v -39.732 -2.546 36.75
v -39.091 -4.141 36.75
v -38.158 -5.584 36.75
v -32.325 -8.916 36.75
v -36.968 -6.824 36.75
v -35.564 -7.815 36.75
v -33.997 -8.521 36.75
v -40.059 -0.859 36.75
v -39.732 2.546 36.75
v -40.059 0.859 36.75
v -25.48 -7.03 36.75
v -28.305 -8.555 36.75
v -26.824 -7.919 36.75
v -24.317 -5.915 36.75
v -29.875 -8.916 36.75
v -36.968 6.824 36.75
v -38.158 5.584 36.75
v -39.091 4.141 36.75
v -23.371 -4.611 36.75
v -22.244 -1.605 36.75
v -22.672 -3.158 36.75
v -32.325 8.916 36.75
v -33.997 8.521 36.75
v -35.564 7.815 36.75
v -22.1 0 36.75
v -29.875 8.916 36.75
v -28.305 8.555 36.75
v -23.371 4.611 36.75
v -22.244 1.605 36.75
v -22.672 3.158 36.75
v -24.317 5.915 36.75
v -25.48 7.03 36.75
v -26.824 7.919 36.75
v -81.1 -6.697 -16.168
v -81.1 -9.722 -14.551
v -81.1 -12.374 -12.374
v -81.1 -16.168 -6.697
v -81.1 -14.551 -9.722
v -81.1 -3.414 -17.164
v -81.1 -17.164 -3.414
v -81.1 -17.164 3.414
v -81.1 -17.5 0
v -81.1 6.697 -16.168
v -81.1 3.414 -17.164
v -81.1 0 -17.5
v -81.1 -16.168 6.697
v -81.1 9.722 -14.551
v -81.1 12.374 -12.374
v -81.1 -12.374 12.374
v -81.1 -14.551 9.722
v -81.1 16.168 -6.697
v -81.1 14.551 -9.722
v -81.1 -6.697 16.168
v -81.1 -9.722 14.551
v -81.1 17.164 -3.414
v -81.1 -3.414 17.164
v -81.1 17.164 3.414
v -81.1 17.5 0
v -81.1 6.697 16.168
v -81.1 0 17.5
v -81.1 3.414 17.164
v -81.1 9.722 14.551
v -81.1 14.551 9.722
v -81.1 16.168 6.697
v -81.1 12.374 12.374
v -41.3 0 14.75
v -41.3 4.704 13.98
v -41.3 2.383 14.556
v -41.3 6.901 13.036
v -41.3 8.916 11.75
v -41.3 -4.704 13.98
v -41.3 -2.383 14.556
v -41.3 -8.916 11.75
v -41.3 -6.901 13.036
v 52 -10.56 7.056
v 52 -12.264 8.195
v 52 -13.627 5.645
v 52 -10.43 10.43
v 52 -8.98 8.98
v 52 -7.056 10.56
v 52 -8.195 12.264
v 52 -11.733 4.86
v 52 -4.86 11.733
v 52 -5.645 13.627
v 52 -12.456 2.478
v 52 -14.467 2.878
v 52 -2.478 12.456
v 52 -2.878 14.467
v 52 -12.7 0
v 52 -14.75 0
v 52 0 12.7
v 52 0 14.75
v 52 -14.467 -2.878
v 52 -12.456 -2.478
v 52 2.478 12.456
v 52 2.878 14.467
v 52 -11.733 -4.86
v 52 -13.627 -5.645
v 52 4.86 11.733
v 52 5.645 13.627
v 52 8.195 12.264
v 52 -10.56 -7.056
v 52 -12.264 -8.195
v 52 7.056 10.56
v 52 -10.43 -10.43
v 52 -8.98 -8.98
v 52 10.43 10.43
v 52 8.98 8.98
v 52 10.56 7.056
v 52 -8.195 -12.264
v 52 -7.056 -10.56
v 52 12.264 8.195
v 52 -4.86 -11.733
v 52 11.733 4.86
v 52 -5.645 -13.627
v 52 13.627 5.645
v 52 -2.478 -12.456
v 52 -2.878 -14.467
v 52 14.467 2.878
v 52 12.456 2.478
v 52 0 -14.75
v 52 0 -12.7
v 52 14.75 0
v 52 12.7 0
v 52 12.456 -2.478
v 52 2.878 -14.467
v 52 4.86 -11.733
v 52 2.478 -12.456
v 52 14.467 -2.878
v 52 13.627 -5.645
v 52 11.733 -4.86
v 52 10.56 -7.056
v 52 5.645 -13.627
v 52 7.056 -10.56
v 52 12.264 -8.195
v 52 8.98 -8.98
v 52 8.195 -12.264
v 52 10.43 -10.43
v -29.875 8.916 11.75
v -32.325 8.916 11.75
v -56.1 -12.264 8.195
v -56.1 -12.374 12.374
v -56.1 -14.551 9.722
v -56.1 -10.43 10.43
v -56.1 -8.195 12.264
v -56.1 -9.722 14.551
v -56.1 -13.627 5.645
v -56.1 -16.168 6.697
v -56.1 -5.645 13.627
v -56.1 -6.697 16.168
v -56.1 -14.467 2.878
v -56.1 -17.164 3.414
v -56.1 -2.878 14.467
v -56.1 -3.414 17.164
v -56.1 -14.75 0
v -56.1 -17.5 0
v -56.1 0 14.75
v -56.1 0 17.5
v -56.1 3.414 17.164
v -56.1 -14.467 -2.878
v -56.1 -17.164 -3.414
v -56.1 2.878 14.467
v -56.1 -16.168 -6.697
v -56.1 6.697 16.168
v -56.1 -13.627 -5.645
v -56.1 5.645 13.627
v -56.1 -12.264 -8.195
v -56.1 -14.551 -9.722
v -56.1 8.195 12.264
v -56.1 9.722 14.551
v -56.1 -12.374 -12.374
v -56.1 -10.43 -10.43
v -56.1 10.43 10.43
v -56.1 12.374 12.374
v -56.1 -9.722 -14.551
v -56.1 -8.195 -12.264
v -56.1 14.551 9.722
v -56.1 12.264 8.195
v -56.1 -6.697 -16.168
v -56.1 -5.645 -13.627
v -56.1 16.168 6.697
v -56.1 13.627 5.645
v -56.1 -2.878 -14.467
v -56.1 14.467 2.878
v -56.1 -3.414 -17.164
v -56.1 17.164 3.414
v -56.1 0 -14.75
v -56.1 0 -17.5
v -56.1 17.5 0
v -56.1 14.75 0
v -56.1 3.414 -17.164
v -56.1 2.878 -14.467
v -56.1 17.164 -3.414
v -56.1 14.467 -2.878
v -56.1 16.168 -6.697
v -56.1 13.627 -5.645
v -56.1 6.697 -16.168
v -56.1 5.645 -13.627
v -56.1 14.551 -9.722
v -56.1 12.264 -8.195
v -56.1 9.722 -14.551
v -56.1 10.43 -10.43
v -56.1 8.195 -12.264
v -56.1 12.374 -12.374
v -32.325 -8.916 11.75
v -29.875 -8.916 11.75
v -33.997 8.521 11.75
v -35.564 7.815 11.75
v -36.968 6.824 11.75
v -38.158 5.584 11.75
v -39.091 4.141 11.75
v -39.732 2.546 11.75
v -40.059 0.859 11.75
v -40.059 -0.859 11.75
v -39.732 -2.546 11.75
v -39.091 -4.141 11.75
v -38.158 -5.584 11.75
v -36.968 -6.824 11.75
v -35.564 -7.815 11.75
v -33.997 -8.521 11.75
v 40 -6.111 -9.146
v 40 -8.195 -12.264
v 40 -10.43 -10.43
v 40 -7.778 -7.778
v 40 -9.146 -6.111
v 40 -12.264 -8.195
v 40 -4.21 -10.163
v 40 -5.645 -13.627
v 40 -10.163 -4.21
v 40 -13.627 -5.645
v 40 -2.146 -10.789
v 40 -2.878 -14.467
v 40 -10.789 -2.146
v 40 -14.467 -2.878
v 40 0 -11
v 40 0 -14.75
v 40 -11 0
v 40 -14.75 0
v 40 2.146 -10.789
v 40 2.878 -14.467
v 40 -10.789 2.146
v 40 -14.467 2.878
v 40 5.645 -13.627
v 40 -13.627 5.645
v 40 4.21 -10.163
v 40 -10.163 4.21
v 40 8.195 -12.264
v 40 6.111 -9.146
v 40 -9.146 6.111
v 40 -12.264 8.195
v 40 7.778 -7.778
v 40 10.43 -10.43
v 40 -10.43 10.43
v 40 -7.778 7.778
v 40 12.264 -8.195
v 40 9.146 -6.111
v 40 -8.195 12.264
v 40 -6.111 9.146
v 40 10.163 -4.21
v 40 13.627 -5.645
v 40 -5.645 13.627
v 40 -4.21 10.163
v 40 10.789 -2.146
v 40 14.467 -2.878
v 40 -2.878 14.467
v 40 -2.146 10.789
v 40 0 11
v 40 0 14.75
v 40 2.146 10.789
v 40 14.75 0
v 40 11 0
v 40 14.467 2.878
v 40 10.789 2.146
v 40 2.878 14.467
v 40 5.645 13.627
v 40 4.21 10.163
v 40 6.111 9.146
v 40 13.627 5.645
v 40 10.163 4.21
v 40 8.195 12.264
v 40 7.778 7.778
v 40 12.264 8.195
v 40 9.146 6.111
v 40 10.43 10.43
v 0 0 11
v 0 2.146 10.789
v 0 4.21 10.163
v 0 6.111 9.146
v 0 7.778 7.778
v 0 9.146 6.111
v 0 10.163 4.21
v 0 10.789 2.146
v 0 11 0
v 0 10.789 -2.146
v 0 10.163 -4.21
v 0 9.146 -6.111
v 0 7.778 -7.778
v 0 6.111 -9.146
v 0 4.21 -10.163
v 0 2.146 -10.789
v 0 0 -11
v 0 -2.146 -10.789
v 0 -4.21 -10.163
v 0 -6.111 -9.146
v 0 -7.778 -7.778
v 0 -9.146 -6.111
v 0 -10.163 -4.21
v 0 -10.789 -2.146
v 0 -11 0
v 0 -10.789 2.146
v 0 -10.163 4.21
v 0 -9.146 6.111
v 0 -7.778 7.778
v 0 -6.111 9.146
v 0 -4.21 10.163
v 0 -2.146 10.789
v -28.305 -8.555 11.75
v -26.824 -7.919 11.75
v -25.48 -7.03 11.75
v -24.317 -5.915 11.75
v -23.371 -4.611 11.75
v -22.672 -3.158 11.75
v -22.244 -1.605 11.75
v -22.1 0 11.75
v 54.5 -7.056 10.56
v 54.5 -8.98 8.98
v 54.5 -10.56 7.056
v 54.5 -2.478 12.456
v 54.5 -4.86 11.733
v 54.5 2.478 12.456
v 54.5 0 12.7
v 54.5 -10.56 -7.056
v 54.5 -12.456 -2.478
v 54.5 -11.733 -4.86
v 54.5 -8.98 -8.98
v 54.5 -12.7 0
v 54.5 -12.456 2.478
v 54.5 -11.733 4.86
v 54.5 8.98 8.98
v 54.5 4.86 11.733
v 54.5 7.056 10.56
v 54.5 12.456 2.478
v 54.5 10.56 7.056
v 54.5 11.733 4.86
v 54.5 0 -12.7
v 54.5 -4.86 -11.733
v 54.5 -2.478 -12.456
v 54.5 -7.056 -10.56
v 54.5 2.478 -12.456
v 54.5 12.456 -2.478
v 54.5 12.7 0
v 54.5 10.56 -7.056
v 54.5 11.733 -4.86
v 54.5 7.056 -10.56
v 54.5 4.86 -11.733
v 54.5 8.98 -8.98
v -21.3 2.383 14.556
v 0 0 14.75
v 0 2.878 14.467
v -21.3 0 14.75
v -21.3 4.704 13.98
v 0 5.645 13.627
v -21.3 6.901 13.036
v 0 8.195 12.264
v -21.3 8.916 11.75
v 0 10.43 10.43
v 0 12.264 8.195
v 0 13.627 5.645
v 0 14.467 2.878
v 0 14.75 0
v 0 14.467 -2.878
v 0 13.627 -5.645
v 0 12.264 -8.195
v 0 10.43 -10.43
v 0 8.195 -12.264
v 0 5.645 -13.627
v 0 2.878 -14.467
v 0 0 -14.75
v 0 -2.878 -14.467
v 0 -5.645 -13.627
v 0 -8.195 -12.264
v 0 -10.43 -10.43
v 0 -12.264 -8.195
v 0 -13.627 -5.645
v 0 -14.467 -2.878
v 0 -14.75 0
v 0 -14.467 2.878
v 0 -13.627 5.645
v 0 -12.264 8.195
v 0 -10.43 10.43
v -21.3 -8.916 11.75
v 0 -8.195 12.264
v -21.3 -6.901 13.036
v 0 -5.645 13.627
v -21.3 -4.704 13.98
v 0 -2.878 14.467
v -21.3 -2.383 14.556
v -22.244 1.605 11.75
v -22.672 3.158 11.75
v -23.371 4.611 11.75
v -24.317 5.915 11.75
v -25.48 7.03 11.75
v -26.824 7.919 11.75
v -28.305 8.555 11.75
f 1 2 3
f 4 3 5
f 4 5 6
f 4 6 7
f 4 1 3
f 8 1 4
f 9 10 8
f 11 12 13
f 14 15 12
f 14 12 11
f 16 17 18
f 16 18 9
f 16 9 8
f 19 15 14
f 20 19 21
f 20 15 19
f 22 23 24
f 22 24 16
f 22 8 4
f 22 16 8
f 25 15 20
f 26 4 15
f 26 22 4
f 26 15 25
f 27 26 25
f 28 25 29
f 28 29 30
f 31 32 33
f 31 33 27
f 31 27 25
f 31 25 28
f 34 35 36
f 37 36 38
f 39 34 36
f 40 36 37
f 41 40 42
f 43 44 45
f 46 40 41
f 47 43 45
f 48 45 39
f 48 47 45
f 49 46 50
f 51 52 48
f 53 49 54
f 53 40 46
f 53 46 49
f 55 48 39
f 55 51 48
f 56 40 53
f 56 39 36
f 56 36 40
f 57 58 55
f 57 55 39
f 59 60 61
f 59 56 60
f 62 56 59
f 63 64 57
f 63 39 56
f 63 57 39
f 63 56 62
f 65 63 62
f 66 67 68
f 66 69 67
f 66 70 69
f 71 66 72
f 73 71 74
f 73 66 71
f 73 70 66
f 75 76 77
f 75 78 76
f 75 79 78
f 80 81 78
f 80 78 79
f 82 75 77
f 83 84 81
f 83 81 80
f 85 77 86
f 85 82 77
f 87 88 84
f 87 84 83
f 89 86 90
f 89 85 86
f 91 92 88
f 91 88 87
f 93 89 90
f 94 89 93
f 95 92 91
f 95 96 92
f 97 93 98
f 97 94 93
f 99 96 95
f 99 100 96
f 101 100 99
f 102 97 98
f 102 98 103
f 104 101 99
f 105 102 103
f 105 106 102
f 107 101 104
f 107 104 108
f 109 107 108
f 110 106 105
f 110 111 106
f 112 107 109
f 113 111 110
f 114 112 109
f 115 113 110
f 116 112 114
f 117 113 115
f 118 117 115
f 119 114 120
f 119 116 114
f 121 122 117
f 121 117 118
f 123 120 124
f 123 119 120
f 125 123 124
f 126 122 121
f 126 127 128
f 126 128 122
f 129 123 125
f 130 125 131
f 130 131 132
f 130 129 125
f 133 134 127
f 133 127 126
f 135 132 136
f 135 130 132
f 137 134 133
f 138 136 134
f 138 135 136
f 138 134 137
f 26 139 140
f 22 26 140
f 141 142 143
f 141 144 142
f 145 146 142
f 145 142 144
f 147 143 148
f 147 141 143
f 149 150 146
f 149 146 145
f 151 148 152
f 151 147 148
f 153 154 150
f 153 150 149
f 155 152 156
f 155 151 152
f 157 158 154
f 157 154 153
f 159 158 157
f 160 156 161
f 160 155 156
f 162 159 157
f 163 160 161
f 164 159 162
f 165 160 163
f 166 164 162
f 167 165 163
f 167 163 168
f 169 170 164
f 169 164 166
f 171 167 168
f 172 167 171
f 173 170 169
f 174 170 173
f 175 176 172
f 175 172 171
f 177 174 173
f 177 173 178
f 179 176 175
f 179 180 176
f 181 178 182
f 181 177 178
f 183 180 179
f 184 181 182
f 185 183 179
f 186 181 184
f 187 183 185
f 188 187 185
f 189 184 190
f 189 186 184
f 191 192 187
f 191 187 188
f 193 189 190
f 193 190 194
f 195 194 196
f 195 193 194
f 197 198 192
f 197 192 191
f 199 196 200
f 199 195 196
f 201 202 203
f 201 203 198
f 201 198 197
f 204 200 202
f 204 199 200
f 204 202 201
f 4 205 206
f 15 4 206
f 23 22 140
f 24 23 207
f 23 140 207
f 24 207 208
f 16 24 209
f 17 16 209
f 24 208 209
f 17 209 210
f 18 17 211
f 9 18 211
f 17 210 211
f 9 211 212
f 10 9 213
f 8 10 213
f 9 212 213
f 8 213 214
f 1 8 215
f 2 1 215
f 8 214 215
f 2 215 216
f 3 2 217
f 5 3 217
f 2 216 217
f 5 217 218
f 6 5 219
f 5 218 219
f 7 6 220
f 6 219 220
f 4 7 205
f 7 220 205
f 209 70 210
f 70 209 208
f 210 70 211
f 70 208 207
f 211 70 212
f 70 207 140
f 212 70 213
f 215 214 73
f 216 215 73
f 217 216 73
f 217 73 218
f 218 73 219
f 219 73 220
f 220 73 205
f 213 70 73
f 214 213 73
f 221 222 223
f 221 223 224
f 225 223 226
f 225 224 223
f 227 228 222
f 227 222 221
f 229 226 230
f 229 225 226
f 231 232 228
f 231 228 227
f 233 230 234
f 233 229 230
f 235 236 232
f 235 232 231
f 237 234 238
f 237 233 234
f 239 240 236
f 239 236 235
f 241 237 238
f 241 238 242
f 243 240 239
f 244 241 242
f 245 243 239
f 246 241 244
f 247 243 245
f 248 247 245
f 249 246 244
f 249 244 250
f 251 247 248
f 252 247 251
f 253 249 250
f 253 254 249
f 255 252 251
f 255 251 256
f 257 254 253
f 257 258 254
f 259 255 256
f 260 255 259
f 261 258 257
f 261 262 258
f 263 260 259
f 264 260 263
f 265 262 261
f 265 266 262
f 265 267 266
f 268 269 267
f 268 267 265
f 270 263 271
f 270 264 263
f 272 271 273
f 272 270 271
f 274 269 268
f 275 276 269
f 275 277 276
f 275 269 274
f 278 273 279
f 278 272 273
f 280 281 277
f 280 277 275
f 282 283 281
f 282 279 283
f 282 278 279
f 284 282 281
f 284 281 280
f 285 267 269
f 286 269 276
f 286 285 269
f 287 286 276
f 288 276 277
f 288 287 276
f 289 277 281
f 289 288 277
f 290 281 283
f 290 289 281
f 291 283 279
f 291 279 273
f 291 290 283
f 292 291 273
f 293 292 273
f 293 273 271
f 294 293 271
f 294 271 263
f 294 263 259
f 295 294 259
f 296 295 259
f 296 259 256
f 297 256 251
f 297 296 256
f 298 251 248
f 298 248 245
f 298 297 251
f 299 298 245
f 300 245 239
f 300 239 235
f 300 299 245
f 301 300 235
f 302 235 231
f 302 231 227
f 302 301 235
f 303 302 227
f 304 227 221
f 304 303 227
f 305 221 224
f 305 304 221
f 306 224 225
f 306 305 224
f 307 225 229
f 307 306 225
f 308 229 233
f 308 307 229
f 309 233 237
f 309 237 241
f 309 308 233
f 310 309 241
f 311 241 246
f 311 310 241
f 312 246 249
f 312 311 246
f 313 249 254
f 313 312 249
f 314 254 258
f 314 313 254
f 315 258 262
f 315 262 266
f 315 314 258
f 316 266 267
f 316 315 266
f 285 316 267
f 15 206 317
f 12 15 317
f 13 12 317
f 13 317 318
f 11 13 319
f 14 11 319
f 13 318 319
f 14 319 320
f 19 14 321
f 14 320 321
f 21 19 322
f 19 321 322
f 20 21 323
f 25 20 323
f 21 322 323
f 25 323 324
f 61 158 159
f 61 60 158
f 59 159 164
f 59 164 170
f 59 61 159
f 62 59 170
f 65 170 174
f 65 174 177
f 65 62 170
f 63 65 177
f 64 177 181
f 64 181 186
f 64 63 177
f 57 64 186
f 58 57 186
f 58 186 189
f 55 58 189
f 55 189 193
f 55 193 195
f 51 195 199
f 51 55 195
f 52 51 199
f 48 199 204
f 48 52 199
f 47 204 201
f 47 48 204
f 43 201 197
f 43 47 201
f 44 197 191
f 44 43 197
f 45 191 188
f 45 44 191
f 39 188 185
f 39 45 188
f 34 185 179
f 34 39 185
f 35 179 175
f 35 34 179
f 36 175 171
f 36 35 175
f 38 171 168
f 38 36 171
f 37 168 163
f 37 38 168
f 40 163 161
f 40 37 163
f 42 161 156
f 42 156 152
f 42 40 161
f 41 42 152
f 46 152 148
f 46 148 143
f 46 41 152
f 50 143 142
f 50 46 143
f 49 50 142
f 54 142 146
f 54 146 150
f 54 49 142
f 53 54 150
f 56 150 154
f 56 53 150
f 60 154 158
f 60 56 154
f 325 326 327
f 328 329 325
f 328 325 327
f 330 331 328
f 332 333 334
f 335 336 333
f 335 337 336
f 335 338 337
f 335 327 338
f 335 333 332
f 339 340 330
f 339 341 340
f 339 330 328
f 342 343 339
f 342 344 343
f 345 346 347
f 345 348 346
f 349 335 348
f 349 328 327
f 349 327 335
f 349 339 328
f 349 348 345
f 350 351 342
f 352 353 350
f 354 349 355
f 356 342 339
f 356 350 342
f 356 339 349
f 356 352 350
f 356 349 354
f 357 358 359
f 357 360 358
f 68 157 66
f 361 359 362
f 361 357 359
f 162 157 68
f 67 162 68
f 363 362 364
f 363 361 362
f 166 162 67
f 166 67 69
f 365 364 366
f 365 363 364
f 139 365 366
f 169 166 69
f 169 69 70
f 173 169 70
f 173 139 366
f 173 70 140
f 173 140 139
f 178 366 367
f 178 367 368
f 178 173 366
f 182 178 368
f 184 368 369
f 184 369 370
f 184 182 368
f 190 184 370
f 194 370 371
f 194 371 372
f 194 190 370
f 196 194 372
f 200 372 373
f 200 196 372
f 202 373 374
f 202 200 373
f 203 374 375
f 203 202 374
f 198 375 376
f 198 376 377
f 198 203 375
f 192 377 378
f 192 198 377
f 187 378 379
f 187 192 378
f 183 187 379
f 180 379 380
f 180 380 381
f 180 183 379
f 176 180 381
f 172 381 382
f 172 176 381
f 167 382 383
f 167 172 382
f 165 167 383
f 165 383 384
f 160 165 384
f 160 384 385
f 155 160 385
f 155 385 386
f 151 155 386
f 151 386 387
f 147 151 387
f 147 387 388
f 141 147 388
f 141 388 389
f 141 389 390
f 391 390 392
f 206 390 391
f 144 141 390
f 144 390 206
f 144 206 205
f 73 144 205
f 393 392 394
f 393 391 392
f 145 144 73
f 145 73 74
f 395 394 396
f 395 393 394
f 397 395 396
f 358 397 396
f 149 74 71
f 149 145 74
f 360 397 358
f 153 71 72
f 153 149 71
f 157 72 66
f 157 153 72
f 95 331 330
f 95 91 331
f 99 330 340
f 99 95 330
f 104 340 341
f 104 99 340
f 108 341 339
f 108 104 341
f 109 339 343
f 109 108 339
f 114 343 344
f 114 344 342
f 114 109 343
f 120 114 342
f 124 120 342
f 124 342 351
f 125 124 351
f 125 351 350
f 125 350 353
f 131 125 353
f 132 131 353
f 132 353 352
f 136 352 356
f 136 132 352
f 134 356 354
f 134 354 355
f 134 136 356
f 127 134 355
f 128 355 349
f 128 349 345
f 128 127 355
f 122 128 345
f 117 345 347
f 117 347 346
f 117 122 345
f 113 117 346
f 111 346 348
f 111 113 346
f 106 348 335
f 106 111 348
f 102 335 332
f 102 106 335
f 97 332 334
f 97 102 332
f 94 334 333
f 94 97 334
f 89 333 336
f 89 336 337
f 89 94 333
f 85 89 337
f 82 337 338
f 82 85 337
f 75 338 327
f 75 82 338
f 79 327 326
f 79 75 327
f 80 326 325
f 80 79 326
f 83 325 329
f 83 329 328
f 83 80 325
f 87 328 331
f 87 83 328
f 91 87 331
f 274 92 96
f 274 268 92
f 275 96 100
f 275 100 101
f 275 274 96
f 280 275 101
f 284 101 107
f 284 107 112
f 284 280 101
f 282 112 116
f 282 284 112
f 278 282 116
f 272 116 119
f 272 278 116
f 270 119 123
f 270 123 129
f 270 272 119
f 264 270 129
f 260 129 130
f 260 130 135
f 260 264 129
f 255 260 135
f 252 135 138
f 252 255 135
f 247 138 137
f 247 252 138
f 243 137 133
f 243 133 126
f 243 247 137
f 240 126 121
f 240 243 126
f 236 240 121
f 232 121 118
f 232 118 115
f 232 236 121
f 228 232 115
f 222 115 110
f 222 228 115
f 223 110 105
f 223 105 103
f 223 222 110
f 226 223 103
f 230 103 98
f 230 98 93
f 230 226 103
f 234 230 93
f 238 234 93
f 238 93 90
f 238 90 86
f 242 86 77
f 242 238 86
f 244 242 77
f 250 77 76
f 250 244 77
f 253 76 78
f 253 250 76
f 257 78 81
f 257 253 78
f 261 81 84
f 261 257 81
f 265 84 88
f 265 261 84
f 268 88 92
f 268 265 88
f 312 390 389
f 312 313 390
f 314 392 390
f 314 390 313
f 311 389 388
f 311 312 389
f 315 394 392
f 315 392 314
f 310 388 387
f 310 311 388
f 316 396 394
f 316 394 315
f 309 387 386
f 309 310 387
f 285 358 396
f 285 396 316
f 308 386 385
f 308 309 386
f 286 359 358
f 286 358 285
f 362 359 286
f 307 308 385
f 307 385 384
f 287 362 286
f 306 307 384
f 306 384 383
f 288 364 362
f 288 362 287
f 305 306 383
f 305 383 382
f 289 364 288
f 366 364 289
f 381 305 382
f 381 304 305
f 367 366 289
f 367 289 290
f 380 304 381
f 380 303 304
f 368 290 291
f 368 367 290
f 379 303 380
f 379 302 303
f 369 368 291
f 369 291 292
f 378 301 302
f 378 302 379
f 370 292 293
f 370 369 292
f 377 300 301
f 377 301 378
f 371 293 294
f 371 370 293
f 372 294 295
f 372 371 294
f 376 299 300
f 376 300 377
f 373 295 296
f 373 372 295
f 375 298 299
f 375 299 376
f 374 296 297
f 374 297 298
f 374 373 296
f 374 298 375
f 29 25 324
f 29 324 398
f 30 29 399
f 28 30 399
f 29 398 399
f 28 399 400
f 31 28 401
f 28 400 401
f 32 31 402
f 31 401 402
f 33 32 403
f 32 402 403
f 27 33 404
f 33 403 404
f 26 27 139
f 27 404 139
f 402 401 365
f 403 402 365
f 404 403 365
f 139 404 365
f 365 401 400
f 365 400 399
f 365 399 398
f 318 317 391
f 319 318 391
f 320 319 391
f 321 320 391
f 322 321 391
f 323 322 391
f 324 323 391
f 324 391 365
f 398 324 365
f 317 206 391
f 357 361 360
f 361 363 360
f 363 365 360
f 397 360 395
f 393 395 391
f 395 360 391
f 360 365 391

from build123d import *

# Parameters (mm, degrees)
F2_W     = 20
F2_H     = 3
F3_DEPTH = 10.1
F5_DEPTH = 25


with BuildPart() as f1:
    # F0 (on Front) → F1 (revolve)
    with BuildSketch(Plane.XZ):
        Polygon((-81.1, 0), (54.5, 0), (54.5, 12.7), (52, 12.7), (52, 14.75), (40, 14.75), (40, 11), (0, 11), (0, 14.75), (-56.1, 14.75), (-56.1, 17.5), (-81.1, 17.5), align=None)
    revolve(axis=Axis((-19.562621, 0, 0), (-1, 0, 0)))

    # F2 (on Front) → F3 (cut, symmetric)
    with BuildSketch(Plane.XZ):
        with Locations((-31.3, 13.25)):
            Rectangle(F2_W, F2_H)
    extrude(amount=F3_DEPTH, both=True, mode=Mode.SUBTRACT)

    # F4 (on face) → F5 (join)
    with BuildSketch(Plane.XY.offset(11.75)):
        with BuildLine():
            ThreePointArc((-29.875255, -8.916277), (-24.316833, -5.91512), (-22.1, 0))
            ThreePointArc((-22.1, 0), (-24.316833, 5.91512), (-29.875255, 8.916277))
            Line((-29.875255, 8.916277), (-32.324745, 8.916277))
            ThreePointArc((-32.324745, 8.916277), (-40.1, 0), (-32.324745, -8.916277))
            Line((-32.324745, -8.916277), (-29.875255, -8.916277))
        make_face()
    extrude(amount=F5_DEPTH)


solid = f1.part
